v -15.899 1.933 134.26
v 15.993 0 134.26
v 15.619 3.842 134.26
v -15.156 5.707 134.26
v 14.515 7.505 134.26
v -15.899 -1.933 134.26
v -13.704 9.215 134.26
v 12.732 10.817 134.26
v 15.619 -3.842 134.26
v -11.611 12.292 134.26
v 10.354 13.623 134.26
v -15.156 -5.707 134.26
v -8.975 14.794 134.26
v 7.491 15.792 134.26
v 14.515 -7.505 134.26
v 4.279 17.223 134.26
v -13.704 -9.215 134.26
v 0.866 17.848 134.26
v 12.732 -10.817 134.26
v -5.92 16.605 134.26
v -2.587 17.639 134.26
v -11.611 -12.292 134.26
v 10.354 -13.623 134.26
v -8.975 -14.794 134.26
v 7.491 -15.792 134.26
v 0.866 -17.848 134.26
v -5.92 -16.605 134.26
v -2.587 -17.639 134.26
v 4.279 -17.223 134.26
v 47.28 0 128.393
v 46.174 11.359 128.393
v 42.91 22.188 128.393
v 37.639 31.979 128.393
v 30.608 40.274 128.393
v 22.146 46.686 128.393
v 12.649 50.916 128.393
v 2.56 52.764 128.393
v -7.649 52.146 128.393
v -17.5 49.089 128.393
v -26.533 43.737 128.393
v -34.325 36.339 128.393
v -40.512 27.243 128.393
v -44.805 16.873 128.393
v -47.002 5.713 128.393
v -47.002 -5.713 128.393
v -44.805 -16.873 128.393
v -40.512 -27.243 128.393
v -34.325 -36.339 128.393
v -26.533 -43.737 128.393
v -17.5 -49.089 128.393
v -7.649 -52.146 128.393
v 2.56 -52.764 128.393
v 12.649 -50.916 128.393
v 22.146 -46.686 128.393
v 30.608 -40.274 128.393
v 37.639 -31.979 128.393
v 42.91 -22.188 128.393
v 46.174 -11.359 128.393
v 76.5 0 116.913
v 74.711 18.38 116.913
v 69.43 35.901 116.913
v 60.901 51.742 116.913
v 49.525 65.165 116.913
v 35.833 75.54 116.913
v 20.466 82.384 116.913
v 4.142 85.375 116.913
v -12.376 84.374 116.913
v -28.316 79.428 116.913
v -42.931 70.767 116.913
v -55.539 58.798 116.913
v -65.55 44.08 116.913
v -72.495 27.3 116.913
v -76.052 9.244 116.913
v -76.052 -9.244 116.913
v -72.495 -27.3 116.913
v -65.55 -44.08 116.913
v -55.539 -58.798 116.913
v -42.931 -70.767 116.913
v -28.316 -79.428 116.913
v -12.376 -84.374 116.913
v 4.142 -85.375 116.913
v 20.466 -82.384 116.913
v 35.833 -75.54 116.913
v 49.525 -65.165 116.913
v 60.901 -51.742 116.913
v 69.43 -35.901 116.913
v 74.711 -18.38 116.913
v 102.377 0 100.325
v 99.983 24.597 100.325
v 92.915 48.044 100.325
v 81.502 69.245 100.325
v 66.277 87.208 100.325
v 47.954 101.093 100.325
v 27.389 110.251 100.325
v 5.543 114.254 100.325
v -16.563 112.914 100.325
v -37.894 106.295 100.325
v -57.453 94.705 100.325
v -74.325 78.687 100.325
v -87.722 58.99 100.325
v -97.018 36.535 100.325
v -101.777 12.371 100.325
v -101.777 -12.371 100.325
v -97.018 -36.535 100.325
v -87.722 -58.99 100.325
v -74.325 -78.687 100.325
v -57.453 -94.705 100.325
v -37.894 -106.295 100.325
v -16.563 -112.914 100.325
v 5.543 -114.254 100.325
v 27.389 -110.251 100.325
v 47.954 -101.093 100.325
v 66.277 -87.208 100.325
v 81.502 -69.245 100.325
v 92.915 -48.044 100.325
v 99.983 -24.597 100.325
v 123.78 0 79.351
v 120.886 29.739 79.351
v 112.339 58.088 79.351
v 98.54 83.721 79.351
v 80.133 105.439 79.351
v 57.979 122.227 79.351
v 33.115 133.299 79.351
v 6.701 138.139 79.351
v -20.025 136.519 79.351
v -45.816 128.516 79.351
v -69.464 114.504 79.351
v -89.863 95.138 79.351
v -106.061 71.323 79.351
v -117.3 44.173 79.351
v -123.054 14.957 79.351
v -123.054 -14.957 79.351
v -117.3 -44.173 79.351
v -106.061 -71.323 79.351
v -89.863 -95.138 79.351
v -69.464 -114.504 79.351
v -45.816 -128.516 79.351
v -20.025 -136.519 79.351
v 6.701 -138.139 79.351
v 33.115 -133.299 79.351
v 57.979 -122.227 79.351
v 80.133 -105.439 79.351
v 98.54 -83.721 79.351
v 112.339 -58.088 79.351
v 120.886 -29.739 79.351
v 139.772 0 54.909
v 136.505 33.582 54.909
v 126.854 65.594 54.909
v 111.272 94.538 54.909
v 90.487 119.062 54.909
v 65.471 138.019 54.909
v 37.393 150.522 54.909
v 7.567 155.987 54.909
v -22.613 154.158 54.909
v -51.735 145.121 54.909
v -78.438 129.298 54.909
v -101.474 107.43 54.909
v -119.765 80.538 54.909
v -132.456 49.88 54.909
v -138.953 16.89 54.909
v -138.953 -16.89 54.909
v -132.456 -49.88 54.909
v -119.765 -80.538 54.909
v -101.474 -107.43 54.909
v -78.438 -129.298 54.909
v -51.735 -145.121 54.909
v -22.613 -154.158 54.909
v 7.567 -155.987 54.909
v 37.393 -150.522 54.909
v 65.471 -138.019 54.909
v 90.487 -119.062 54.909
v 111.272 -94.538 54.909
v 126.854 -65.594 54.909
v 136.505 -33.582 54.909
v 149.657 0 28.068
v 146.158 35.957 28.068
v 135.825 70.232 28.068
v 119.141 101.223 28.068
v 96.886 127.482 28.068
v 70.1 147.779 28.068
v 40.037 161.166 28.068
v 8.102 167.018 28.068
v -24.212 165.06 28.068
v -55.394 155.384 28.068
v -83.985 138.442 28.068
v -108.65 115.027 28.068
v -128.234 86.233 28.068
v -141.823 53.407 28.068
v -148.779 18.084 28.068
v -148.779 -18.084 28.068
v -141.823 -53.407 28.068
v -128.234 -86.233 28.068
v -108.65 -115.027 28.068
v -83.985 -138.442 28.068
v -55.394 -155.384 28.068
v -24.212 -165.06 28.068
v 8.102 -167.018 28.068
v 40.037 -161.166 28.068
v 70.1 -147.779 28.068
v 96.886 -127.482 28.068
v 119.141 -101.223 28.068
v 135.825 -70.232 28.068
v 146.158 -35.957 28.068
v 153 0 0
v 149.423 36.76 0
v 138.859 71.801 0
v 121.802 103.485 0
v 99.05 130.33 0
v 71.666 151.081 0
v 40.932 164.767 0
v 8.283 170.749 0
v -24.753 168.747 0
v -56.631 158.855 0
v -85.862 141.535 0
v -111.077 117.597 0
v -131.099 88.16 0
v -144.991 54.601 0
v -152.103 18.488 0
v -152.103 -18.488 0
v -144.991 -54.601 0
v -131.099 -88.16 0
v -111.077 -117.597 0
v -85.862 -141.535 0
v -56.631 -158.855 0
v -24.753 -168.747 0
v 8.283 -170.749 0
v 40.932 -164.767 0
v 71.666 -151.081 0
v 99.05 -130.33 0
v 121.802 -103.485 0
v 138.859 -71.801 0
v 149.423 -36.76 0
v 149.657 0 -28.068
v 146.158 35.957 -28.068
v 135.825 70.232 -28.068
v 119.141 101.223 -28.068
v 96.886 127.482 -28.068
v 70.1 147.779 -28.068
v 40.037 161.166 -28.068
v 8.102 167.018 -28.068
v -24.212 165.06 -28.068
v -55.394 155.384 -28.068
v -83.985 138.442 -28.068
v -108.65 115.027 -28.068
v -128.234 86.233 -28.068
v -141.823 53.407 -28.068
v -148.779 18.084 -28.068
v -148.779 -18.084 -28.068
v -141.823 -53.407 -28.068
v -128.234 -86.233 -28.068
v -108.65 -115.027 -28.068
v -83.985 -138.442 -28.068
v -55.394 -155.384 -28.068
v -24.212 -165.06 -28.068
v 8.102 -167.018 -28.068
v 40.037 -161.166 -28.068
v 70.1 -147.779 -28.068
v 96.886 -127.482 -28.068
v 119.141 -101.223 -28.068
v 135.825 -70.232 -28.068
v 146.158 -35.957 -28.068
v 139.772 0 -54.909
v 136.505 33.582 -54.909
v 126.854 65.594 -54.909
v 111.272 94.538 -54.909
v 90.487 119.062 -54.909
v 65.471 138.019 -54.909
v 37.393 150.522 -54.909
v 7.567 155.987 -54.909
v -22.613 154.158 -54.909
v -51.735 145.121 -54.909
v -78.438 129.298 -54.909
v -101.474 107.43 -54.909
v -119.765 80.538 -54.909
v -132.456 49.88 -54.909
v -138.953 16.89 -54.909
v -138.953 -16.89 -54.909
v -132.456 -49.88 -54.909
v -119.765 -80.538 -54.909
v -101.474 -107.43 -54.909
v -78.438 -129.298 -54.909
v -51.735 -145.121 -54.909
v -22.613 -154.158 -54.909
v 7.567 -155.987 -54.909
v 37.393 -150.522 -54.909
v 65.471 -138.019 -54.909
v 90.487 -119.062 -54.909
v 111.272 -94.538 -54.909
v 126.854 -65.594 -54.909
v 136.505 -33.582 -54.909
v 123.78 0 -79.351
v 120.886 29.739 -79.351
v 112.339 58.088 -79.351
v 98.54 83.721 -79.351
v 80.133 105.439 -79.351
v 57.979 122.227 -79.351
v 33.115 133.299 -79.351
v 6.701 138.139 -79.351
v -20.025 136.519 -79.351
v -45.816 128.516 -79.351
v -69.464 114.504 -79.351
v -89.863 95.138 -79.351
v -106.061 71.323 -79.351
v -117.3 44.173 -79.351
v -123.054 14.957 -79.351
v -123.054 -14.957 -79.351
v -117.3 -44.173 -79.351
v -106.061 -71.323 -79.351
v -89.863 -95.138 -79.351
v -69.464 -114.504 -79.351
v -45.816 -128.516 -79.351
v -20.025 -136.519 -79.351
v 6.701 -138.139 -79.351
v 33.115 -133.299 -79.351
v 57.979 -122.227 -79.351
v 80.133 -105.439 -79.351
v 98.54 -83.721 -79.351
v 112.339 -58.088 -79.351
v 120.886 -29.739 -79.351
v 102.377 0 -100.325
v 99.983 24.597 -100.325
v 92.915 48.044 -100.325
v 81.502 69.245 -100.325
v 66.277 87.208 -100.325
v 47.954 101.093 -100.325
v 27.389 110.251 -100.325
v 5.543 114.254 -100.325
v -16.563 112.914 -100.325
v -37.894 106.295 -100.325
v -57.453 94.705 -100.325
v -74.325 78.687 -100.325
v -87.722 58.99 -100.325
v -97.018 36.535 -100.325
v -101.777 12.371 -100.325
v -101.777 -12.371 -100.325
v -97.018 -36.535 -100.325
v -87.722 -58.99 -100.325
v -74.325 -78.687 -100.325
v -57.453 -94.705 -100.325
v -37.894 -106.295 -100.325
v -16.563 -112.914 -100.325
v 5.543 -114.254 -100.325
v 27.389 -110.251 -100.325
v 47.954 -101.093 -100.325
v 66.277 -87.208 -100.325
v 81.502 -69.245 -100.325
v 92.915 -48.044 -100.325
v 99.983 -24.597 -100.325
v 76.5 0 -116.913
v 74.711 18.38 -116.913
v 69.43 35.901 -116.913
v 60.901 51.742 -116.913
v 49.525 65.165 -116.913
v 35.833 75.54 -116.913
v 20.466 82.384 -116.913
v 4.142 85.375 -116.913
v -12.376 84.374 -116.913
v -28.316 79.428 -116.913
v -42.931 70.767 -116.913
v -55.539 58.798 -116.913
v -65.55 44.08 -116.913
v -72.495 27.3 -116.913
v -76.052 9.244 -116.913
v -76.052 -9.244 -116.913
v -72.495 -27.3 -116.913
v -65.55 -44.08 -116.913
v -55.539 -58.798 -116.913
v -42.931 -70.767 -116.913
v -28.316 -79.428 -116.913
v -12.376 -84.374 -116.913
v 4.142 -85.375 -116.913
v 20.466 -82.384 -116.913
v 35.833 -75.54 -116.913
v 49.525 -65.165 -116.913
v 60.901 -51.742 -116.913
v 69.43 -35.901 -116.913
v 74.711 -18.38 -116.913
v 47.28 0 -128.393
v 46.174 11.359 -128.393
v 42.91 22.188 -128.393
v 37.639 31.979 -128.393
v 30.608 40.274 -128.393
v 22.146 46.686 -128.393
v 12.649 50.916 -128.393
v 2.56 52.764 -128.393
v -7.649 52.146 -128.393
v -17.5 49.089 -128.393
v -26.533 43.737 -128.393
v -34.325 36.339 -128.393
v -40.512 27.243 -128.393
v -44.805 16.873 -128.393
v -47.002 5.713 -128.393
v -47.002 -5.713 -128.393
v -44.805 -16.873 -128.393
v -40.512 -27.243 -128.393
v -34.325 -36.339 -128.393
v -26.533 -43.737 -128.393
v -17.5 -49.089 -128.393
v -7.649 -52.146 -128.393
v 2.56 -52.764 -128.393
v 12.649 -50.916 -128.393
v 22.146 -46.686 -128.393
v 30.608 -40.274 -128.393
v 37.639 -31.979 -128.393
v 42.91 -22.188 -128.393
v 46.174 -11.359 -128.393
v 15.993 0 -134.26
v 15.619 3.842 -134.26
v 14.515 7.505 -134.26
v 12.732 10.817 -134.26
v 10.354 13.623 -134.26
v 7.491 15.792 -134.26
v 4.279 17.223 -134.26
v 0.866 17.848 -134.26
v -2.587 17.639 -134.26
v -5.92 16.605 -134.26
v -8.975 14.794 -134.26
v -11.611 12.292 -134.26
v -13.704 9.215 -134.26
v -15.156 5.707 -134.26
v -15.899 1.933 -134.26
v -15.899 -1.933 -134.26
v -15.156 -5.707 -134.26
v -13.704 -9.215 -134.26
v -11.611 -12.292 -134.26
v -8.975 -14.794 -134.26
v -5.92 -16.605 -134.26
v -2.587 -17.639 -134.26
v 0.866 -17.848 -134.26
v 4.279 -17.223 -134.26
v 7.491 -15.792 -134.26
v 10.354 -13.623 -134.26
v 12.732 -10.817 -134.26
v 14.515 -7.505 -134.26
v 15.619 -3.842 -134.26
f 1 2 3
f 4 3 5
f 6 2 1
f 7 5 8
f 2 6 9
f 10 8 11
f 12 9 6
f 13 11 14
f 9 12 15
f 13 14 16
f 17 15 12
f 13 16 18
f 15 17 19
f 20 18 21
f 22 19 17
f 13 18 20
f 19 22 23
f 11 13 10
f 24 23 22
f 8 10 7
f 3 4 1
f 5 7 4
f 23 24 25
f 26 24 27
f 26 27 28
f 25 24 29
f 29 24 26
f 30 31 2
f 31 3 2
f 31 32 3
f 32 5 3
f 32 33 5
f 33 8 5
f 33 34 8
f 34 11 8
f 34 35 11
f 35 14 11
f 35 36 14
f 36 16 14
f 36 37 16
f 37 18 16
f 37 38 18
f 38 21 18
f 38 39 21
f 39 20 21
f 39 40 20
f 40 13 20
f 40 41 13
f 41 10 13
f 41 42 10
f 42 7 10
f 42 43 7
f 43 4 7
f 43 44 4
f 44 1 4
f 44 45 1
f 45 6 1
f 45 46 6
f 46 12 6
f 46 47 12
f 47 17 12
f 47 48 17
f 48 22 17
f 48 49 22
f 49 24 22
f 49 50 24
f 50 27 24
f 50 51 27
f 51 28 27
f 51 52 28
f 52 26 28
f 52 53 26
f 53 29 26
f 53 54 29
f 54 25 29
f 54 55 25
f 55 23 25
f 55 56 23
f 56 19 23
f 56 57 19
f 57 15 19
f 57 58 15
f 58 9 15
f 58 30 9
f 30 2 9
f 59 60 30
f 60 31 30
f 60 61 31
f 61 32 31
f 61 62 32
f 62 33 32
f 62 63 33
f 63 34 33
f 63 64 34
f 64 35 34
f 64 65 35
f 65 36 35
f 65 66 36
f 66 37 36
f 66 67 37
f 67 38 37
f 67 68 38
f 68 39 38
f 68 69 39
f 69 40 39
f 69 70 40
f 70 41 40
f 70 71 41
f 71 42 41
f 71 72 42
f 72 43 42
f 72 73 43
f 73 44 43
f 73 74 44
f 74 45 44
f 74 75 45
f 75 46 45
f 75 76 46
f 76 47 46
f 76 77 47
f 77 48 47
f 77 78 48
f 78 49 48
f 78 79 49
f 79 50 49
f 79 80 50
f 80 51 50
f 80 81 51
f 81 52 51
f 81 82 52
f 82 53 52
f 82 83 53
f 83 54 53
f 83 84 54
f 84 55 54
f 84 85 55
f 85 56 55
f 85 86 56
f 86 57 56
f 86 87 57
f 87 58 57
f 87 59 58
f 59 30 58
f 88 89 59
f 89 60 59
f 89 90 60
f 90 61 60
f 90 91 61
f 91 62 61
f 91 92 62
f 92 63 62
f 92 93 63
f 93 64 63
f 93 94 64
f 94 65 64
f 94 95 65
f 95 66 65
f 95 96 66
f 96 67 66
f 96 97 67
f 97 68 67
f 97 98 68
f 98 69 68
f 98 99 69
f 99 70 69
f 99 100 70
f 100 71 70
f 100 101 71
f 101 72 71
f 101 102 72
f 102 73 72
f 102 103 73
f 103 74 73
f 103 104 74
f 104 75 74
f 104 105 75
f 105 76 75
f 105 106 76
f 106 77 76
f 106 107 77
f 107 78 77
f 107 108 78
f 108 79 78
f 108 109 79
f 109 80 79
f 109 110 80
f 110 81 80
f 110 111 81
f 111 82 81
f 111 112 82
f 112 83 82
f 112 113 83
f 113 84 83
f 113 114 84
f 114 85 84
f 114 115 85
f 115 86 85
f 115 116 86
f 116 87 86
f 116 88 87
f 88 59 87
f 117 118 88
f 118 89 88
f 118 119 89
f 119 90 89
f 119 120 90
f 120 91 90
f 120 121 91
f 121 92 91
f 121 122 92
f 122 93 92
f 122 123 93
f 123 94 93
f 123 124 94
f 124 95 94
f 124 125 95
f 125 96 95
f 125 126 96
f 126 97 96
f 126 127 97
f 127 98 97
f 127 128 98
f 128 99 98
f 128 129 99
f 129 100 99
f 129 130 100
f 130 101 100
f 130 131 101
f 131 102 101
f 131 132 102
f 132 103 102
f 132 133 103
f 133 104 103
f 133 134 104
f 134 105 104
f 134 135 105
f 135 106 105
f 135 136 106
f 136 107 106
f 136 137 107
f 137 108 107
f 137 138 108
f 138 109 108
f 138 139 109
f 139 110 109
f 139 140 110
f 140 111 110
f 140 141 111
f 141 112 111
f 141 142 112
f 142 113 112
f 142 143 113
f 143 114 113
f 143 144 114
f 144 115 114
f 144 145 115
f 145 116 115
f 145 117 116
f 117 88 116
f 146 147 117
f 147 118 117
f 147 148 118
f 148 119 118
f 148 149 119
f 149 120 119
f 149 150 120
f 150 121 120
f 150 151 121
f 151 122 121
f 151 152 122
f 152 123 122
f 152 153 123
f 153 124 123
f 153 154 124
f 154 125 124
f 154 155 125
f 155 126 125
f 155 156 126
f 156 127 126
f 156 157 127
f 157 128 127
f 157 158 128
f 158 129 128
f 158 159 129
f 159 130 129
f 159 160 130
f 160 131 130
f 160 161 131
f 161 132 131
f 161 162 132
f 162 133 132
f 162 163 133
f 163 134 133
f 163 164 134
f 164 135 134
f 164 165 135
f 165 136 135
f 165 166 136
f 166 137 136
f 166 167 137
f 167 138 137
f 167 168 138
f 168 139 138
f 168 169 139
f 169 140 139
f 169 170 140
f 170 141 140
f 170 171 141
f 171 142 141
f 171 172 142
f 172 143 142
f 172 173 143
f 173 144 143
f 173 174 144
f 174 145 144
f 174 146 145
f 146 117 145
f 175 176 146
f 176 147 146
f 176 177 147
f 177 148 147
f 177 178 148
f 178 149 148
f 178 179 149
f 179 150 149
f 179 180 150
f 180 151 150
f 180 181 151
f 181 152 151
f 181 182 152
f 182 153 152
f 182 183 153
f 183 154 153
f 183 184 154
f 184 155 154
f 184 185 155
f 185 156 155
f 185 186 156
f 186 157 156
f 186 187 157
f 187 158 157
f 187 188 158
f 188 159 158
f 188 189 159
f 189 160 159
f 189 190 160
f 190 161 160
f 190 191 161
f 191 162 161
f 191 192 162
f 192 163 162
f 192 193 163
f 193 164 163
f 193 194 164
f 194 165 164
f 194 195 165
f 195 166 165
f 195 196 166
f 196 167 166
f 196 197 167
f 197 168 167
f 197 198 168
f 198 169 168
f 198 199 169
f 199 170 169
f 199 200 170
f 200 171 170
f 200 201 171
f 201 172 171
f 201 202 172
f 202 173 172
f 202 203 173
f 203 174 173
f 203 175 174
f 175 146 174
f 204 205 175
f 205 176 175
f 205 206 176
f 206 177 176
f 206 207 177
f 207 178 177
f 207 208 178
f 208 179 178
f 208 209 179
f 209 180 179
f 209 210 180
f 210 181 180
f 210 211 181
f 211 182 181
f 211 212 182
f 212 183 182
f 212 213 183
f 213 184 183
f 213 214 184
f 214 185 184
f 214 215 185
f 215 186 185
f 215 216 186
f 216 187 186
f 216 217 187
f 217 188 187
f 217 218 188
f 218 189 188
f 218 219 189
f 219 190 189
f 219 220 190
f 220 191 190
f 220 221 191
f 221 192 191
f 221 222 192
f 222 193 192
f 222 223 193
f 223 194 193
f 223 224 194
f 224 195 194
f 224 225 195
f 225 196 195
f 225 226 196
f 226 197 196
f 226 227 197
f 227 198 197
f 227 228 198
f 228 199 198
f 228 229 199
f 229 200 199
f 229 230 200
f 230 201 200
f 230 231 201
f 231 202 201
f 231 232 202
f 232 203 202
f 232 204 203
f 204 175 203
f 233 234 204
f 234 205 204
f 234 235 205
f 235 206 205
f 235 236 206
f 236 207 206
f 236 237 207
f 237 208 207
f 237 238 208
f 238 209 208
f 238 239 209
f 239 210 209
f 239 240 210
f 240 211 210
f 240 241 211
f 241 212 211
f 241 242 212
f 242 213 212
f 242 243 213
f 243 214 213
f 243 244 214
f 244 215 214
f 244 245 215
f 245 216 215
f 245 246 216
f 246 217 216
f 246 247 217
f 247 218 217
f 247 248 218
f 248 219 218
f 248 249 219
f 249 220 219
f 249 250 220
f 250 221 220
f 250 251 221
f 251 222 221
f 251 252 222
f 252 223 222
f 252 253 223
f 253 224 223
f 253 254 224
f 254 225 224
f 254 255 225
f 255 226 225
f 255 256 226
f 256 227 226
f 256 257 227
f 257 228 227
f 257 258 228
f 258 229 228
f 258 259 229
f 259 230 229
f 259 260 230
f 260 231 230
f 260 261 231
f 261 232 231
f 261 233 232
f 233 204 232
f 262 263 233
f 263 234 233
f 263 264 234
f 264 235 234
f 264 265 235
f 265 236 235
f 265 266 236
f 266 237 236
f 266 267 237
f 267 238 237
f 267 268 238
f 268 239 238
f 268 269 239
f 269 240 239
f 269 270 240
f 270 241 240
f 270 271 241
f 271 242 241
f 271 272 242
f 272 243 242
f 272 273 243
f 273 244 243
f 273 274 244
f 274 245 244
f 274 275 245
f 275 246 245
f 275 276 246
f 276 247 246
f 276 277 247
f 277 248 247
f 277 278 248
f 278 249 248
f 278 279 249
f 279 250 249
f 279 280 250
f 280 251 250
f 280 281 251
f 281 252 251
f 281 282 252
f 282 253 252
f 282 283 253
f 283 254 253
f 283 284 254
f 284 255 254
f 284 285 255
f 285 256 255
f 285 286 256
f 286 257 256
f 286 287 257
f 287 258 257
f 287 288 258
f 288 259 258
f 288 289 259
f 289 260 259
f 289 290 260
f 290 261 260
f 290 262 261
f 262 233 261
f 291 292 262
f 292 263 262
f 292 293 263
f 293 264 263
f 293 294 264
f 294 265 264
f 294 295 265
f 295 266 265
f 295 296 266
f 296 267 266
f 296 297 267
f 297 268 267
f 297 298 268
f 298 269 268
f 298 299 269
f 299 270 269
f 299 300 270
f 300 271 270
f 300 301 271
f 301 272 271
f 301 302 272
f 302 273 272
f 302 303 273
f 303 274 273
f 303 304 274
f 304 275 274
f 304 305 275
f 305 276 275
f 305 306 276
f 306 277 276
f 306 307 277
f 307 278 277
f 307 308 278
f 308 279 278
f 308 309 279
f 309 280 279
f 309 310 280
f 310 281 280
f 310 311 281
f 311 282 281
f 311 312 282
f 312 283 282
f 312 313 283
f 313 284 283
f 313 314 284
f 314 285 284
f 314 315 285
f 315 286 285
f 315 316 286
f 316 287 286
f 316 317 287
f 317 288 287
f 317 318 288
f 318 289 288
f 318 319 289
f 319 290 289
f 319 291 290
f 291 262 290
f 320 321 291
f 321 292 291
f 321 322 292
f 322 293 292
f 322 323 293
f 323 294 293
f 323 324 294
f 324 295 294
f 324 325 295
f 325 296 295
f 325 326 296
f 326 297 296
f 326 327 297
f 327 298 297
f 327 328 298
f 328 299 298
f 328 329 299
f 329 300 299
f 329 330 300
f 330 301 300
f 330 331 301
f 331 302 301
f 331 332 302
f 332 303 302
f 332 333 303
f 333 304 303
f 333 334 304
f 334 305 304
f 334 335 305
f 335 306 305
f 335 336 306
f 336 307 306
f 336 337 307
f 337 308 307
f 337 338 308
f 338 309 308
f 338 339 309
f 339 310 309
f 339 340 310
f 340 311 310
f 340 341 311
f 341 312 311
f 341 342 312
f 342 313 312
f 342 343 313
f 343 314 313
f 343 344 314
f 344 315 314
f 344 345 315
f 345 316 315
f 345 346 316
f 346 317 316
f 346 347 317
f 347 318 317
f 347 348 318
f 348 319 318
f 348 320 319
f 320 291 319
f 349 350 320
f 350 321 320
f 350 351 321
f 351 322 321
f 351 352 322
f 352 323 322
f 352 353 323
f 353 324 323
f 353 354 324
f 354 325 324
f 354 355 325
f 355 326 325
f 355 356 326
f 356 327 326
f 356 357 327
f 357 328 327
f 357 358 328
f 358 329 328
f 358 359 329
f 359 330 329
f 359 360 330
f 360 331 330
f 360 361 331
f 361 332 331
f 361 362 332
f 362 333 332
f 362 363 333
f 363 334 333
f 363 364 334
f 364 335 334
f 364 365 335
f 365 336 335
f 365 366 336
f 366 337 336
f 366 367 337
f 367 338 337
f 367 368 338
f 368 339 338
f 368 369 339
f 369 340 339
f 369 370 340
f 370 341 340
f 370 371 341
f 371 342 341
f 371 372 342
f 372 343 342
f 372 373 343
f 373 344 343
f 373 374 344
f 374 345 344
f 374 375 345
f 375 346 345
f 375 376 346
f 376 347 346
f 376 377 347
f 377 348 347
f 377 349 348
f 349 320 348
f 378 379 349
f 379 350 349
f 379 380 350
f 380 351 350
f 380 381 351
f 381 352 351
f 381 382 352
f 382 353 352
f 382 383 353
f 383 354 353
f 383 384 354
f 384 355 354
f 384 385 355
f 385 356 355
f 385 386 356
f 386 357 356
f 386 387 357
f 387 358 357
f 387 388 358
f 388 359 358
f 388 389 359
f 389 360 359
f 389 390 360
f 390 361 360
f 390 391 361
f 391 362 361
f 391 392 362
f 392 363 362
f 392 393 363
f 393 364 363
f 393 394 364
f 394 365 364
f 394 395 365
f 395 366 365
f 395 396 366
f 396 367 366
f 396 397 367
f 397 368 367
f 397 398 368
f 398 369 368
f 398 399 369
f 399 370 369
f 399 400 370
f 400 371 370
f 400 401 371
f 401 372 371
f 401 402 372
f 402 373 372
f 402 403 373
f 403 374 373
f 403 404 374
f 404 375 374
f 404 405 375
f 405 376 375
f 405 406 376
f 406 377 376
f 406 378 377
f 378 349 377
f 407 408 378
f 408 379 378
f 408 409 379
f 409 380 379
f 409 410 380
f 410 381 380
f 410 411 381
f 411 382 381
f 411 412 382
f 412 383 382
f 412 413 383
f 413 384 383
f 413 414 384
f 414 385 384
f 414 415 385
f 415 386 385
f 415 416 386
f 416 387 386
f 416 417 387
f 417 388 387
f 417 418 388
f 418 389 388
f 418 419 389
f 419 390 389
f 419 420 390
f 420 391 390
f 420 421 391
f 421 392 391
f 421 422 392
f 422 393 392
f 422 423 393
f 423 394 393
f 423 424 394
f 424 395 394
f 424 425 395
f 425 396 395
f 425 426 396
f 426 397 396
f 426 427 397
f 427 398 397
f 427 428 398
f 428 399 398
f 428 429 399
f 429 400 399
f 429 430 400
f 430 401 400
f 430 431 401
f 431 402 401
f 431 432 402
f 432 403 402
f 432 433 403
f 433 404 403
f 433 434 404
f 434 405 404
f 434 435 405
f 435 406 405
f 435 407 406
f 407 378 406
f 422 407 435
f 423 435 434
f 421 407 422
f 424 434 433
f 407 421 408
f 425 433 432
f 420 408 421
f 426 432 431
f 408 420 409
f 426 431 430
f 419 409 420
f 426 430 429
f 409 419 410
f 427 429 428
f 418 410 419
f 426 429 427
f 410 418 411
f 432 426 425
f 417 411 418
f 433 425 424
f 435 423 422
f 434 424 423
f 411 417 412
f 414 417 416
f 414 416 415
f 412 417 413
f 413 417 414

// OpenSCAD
// Generated by SolidPython 1.0.1 on 2020-07-29 00:46:53


scale(v = [17, 19, 15]) {
	sphere(r = 9);
}
/***********************************************
*********      SolidPython code:      **********
************************************************
 
# import packages: SolidPython
from solid import *
from solid.utils import *
from itertools import chain, combinations, permutations


class Resize:

    def __init__(self, scad_file):
        self.scad_file = scad_file
        #self.scad_file = import_scad(scad_file)
        # cone/cylinder param:
        self.r1 = 0
        self.r2 = 0
        self.h = 0
        # rectangular prism param:
        self.w = 0
        self.l = 0
        # ellipse param:
        self.r = 0

    # import OpenScad code (file name corresponds to shape)


    # classify shape + parameters
    def assign(self, param1, param2, param3):
        if self.scad_file == 'cone.scad':
            self.r1 = param1
            self.r2 = param2
            self.h = param3
        elif self.scad_file == 'cylinder.scad':
            self.r1 = param1
            self.r2 = param2
            self.h = param3
        elif self.scad_file == 'rectangularPrism.scad':
            self.h = param1
            self.l = param2
            self.w = param3
        else:
            self.r = param1
            self.h = param2

    # resize parameters
    def iterate(self):
        x = range(3, 20, 2)
        i = 1
        if self.scad_file == 'cone.scad':
            tempList = list(permutations(x, 2))
            for temp in tempList:
                param1 = temp[0]
                param2 = temp[1]
                filepath = 'produced_scad_files/' + 'cone' + str(param1) + '_' + str(param2) + '_' + '.scad'
                scad_render_to_file(cylinder(h=param1, r1=param2, r2=0), filepath)

        elif self.scad_file == 'cylinder.scad':
            tempList = list(permutations(x, 3))
            for temp in tempList:
                param1 = temp[0]
                param2 = temp[1]
                filepath = 'produced_scad_files/' + 'cylinder' + str(param1) + '_' + str(param2) + '_' + '.scad'
                scad_render_to_file(cylinder(h=param1, r1=param2, r2=param2), filepath)

        elif self.scad_file == 'rectangularPrism.scad':
            tempList = list(permutations(x, 3))
            for temp in tempList:
                param1 = temp[0]
                param2 = temp[1]
                param3 = temp[2]
                filepath = 'produced_scad_files/' + 'rectangularPrism' + str(param1) + '_' + str(param2) + '_' + str(
                    param3) + '.scad'
                scad_render_to_file(cube(size=(param1, param2, param3)), filepath)

        elif self.scad_file == 'ellipse.scad':
            tempList = list(permutations(x, 4))
            for temp in tempList:
                param1 = temp[0]
                param2 = temp[1]
                param3 = temp[2]
                param4 = temp[3]
                filepath = 'produced_scad_files/' + 'ellipse' + str(param1) + '_' + str(param2) + '_' + str(param3) + '_' + str(param4) + '.scad'
                scad_render_to_file(scale([param1, param2, param3])(sphere(r=param4)), filepath)

    def render_to_scadfile(self):
        scad_render_to_file(scad, 'example.scad') 
 
************************************************/
